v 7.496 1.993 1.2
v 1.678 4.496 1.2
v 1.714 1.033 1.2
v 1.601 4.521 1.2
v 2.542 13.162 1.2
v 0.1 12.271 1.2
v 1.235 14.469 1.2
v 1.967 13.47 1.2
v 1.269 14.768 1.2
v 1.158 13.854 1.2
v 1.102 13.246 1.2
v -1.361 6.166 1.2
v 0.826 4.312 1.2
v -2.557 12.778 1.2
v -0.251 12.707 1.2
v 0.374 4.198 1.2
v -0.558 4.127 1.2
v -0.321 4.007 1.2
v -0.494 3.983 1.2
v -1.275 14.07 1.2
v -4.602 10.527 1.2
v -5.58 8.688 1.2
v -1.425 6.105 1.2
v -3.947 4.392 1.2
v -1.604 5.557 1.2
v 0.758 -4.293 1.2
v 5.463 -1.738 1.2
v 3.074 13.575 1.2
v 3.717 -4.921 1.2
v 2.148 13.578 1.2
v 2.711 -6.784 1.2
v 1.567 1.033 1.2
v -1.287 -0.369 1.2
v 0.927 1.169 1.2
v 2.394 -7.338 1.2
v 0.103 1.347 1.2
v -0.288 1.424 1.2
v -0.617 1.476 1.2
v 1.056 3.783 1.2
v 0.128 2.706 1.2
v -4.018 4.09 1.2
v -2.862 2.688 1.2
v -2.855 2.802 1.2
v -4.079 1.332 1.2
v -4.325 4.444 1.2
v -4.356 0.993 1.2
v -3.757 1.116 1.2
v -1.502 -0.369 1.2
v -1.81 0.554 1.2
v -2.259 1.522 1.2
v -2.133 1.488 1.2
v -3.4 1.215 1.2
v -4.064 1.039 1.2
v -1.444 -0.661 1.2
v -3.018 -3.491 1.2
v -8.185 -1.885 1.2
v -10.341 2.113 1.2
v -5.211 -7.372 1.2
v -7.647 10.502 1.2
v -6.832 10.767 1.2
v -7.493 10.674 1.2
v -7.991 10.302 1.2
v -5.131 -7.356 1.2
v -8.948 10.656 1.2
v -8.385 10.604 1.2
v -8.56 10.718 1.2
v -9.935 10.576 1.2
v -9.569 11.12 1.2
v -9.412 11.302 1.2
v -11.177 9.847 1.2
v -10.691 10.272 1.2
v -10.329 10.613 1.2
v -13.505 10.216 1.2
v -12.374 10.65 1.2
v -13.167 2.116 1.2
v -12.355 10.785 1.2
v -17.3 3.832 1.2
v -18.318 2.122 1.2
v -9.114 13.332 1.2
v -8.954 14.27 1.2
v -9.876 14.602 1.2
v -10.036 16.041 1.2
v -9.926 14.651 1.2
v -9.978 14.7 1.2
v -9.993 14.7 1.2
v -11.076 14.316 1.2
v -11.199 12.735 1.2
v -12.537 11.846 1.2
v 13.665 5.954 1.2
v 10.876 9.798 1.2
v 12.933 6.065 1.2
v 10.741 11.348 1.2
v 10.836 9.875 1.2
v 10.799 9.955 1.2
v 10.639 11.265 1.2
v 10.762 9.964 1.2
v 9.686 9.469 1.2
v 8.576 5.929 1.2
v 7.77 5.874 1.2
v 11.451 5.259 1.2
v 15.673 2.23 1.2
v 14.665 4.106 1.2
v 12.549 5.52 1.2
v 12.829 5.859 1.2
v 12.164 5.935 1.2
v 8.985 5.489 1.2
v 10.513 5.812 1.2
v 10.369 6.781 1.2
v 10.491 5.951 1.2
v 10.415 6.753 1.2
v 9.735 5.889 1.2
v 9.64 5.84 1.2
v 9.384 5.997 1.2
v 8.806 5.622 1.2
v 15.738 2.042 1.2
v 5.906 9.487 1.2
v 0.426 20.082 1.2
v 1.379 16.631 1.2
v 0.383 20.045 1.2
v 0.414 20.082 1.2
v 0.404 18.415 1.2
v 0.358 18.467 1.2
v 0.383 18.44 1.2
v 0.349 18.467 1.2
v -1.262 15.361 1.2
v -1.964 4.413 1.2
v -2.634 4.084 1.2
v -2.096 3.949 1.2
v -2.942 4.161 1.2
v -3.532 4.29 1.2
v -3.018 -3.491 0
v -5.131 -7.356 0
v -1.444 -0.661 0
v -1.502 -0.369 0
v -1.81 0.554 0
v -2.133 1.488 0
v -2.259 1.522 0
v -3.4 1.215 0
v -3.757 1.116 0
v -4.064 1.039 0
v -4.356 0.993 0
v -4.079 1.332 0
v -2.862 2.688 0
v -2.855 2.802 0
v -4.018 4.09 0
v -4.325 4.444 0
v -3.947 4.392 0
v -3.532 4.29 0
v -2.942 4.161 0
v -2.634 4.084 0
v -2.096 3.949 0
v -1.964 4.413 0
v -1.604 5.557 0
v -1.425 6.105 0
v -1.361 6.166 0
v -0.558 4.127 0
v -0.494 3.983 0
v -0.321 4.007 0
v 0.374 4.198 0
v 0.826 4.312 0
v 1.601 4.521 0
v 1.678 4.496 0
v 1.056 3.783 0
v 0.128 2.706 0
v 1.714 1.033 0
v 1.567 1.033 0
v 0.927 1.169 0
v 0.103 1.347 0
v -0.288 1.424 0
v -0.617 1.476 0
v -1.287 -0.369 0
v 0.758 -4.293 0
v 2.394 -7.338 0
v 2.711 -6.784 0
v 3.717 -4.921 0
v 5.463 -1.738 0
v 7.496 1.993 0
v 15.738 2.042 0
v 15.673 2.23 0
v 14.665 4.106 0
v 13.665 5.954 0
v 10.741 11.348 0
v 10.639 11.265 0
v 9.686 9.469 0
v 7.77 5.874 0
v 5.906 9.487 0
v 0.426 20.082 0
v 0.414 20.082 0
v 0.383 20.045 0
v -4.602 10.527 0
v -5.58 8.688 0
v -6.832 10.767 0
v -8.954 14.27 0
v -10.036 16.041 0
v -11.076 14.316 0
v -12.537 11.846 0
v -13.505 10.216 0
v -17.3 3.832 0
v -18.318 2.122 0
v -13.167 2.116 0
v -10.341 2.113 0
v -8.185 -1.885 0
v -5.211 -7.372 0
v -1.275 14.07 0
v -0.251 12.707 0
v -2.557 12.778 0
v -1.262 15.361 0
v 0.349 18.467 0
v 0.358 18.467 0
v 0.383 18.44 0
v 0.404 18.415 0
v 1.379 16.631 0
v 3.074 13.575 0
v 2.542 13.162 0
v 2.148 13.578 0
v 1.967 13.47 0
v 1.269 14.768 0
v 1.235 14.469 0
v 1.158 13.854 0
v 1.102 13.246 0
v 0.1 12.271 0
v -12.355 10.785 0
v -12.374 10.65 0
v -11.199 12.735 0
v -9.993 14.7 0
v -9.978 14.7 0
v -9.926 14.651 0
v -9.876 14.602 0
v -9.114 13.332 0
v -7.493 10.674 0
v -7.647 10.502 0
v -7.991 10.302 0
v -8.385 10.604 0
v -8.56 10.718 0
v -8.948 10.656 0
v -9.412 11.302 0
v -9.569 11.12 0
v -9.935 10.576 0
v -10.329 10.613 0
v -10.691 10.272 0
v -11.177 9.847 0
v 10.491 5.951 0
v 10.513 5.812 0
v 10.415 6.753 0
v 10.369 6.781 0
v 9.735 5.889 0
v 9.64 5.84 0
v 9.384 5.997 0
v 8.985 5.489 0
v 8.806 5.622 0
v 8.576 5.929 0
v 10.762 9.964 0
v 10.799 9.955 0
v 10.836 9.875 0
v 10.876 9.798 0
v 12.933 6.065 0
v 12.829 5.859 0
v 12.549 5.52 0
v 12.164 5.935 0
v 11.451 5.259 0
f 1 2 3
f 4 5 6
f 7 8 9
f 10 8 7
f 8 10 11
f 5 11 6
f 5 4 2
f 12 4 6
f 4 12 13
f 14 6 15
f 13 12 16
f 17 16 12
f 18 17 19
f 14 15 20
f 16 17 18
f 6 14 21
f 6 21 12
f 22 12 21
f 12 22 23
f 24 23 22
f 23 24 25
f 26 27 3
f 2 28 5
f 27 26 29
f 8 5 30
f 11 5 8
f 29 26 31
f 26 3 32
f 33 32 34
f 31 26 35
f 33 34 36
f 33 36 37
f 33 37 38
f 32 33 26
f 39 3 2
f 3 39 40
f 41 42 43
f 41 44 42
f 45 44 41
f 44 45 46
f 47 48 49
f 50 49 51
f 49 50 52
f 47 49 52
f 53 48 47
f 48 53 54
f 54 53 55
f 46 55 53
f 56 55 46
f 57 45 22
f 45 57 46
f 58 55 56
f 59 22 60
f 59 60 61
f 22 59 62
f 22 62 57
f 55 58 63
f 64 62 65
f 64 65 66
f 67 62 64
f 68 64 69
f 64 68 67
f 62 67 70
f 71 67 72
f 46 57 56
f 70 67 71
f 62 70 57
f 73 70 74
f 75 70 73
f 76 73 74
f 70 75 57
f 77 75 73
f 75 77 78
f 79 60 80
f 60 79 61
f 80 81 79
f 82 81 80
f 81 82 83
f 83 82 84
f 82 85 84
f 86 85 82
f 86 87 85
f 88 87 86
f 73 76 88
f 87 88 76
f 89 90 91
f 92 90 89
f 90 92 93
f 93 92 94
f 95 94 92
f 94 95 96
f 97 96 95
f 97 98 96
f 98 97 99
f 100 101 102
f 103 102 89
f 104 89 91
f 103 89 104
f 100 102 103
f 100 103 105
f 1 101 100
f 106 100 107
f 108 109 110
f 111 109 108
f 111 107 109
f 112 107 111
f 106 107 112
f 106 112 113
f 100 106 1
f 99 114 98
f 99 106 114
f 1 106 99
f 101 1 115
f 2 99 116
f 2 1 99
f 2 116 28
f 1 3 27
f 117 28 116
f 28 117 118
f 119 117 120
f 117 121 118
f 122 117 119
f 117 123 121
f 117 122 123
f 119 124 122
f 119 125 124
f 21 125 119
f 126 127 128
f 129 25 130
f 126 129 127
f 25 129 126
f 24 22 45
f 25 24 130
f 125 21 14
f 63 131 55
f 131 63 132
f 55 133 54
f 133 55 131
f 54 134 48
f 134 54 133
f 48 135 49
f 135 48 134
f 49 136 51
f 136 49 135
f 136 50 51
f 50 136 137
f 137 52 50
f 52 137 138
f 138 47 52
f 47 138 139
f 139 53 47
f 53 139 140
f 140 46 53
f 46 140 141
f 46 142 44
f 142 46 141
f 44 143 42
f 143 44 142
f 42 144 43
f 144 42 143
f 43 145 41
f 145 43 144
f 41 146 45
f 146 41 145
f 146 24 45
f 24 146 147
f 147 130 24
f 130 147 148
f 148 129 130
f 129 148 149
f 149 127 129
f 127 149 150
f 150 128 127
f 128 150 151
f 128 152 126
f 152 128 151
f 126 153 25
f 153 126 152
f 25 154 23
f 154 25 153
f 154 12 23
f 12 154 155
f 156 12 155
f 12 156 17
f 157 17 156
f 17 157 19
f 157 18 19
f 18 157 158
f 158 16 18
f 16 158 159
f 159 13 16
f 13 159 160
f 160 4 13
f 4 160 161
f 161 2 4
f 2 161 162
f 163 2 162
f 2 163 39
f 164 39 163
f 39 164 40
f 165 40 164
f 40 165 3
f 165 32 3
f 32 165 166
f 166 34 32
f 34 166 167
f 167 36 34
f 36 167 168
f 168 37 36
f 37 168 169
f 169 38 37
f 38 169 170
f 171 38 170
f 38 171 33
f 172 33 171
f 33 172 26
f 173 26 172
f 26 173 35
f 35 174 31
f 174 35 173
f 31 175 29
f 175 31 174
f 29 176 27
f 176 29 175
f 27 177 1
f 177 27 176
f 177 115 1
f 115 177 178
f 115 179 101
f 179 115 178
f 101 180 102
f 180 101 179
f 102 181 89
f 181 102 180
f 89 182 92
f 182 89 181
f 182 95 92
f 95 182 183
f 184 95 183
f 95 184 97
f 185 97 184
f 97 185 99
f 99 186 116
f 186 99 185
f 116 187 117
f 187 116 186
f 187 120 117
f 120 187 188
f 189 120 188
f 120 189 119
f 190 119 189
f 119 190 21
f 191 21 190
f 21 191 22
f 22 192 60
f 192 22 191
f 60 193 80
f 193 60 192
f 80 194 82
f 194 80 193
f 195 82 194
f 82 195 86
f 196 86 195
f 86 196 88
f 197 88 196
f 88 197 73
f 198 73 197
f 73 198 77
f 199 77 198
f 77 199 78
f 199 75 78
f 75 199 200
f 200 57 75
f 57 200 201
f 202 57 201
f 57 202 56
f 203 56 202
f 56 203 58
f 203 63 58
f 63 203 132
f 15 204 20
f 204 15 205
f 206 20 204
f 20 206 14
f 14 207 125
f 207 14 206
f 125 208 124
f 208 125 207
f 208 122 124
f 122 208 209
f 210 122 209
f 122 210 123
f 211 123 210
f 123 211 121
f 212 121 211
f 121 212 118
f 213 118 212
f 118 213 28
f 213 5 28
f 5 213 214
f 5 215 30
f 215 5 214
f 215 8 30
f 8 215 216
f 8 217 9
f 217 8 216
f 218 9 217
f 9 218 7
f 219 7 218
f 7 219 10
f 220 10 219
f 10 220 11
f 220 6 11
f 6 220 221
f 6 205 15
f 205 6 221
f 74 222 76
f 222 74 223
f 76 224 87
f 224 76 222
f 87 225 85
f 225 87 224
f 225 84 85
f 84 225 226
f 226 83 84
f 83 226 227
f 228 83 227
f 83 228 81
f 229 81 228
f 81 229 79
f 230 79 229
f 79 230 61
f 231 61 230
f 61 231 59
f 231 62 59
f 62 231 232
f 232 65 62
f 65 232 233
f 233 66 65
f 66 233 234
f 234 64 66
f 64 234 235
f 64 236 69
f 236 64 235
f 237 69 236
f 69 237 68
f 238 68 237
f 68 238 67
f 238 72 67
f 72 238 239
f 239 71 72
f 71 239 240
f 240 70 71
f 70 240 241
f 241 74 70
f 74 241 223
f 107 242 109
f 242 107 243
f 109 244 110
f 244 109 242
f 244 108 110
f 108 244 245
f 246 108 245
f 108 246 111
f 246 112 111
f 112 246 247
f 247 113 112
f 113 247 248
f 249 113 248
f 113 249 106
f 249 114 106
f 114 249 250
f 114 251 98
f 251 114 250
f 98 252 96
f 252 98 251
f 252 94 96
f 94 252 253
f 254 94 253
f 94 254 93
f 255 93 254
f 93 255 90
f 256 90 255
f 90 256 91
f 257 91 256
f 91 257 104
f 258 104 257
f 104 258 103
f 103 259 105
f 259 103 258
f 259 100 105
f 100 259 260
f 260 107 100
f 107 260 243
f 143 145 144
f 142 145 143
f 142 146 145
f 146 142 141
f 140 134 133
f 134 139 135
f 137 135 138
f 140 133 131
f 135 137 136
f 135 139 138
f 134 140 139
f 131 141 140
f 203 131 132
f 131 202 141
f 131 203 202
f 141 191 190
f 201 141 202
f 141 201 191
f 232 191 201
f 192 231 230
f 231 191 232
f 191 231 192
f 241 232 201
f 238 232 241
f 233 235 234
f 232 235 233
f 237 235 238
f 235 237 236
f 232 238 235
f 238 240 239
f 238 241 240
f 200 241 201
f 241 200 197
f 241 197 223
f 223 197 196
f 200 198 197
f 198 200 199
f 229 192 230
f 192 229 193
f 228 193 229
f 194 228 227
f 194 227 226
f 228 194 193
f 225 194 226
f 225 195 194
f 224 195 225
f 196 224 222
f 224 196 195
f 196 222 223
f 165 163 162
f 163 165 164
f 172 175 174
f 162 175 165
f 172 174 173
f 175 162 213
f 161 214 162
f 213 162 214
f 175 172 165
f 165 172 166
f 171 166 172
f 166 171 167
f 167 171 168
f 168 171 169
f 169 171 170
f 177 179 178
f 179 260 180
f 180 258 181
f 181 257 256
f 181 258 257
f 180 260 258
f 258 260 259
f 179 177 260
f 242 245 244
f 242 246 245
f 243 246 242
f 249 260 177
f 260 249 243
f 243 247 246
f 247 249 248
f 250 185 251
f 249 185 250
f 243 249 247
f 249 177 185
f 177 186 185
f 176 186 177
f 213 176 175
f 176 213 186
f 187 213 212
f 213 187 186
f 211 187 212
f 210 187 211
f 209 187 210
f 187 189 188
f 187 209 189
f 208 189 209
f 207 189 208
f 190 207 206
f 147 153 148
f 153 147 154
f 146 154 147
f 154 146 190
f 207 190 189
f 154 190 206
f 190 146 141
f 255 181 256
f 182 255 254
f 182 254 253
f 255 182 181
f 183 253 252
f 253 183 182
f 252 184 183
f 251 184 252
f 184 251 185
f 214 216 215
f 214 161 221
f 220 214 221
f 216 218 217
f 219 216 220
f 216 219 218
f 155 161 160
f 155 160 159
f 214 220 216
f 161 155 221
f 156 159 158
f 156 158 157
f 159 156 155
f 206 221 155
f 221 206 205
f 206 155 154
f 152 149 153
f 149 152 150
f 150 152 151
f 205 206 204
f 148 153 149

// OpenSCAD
// file: ../Parts/rounder.scad
// rounder.scad
// cutting tool for rounding off corners with a cylinder

//---------------------
module rounder(
r=10,   // radius
h=10,   // height
f=22,    // $fn
extra=0.01  // extra size for the cube
){

difference(){
  translate([-extra,-extra,-extra])
  cube([r+extra,r+extra,h+2*extra]);
  translate([r,r,-1])
  cylinder(r=r,h=h+2,$fn=f);
}

}

//---------------------------------------------------------------------------
module bevel(x=1,y=1,h=10){

linear_extrude(height=h)
polygon(points=[[0,0],[x,0],[0,y]]);
    
}
  

//========================

rounder();

//========================
// file: WibbyMask.scad
module WibbyMask_1()
{
 /* Generated by trace2scad version 20150415
    http://aggregate.org/MAKE/TRACE2SCAD/
    Optimized model has 97/3062 original points
 */
 color([0.5, 0.5, 0.5])
 assign(minx=285) /* polygon minx=285 */
 assign(miny=200) /* polygon miny=200 */
 assign(maxx=17468) /* polygon maxx=17468 */
 assign(maxy=19710) /* polygon maxy=19710 */
 assign(dx=maxx-minx)
 assign(dy=maxy-miny)
 assign(maxd=((dx>dy)?dx:dy))
 scale([1/maxd, 1/maxd, 1])
 translate([-minx-dx/2, -miny-dy/2, 0])
 linear_extrude(height=1, convexity=97)
 union() {
  union() {
   polygon([[287,19704],[285,19698],[288,18948],[1165,18950],[1157,19707],[290,19710]], convexity=6);
   polygon([[16492,19689],[16490,19683],[16493,18798],[17405,18795],[17405,19695],[16495,19695]], convexity=6);
   polygon([[9006,16479],[9001,16473],[7380,13378],[7062,12780],[6655,13456],[5965,14595],[5613,15171],[5275,14610],[4800,13807],[4485,13277],[3251,11201],[2920,10645],[4595,10643],[5514,10642],[6215,9342],[7182,7558],[7208,7563],[7895,8820],[8410,9765],[8478,9783],[9588,7689],[9655,7569],[9758,7749],[10085,8355],[10653,9390],[11314,10603],[13994,10619],[13973,10680],[13645,11290],[13320,11891],[12369,13645],[12336,13618],[12026,13034],[11403,11865],[10797,13040],[9015,16485],[9011,16485]], convexity=12);
   polygon([[2910,9868],[2905,9863],[3560,8648],[3795,8212],[4335,7215],[4885,6200],[5510,5050],[6149,3878],[6207,3770],[7803,3787],[7839,3795],[8414,4987],[9076,3795],[9162,3787],[10697,3773],[11930,6068],[13020,8098],[13960,9863],[11730,9870],[11630,9678],[10440,7530],[9750,6288],[9638,6100],[9252,6792],[8835,7565],[8452,8255],[8055,7565],[7695,6928],[7440,6484],[7206,6065],[7180,6074],[6300,7680],[5715,8755],[5120,9845],[5062,9852],[2914,9873]], convexity=12);
   polygon([[380,986],[375,984],[375,350],[1275,350],[1269,985],[385,988]], convexity=6);
   polygon([[16433,872],[16430,868],[16430,200],[17468,203],[17468,873],[16437,875]], convexity=6);
  }
 }
}

module WibbyMask()
{
 /* all layers combined, scaled to within a 1mm cube */
 scale([1, 1, 1/1])
 difference() {
  union() {
   scale([1,1,2]) translate([0,0,-0.5]) WibbyMask_1();
  }
  translate([0,0,-2]) cube([2,2,4],center=true);
 }
}
WibbyMask();
// file: WibbyW.scad
module WibbyW_1()
{
 /* Generated by trace2scad version 20150415
    http://aggregate.org/MAKE/TRACE2SCAD/
    Optimized model has 81/1762 original points
 */
 color([0.5, 0.5, 0.5])
 assign(minx=285) /* polygon minx=285 */
 assign(miny=200) /* polygon miny=200 */
 assign(maxx=17468) /* polygon maxx=17468 */
 assign(maxy=19710) /* polygon maxy=19710 */
 assign(dx=maxx-minx)
 assign(dy=maxy-miny)
 assign(maxd=((dx>dy)?dx:dy))
 scale([1/maxd, 1/maxd, 1])
 translate([-minx-dx/2, -miny-dy/2, 0])
 linear_extrude(height=1, convexity=81)
 union() {
  union() {
   polygon([[287,19704],[285,19698],[288,18948],[1165,18950],[1157,19707],[290,19710]], convexity=6);
   polygon([[16492,19689],[16490,19683],[16493,18798],[17405,18795],[17405,19695],[16495,19695]], convexity=6);
   union() {
    difference() {
     polygon([[2910,9868],[2905,9863],[3560,8648],[3795,8212],[4335,7215],[4885,6200],[5510,5050],[6149,3878],[6207,3770],[7803,3787],[7839,3795],[8414,4987],[9076,3795],[9162,3787],[10697,3773],[11930,6068],[13020,8098],[13960,9863],[11730,9870],[11630,9678],[10440,7530],[9750,6288],[9638,6100],[9252,6792],[8835,7565],[8452,8255],[8055,7565],[7695,6928],[7440,6484],[7206,6065],[7180,6074],[6300,7680],[5715,8755],[5120,9845],[5062,9852],[2914,9873]], convexity=12);
     polygon([[8443,7914],[8454,7903],[9195,6593],[9185,6514],[9142,6413],[8893,6648],[8768,6290],[8746,6307],[8604,6651],[8532,6625],[8479,6623],[8345,6960],[8336,6975],[8140,6590],[8105,6598],[8048,6625],[7958,6443],[7923,6440],[7723,6639],[8421,7925],[8433,7925]], convexity=14);
    }
   }
   polygon([[380,986],[375,984],[375,350],[1275,350],[1269,985],[385,988]], convexity=6);
   polygon([[16433,872],[16430,868],[16430,200],[17468,203],[17468,873],[16437,875]], convexity=6);
  }
 }
}

module WibbyW()
{
 /* all layers combined, scaled to within a 1mm cube */
 scale([1, 1, 1/1])
 difference() {
  union() {
   scale([1,1,2]) translate([0,0,-0.5]) WibbyW_1();
  }
  translate([0,0,-2]) cube([2,2,4],center=true);
 }
}
WibbyW();
// file: WibbyWhite.scad
module WibbyWhite_1()
{
 /* Generated by trace2scad version 20150415
    http://aggregate.org/MAKE/TRACE2SCAD/
    Optimized model has 139/1729 original points
 */
 color([0.5, 0.5, 0.5])
 assign(minx=285) /* polygon minx=285 */
 assign(miny=200) /* polygon miny=200 */
 assign(maxx=17468) /* polygon maxx=17468 */
 assign(maxy=19710) /* polygon maxy=19710 */
 assign(dx=maxx-minx)
 assign(dy=maxy-miny)
 assign(maxd=((dx>dy)?dx:dy))
 scale([1/maxd, 1/maxd, 1])
 translate([-minx-dx/2, -miny-dy/2, 0])
 linear_extrude(height=1, convexity=139)
 union() {
  union() {
   polygon([[287,19704],[285,19698],[288,18948],[1165,18950],[1157,19707],[290,19710]], convexity=6);
   polygon([[16492,19689],[16490,19683],[16493,18798],[17405,18795],[17405,19695],[16495,19695]], convexity=6);
   polygon([[8979,15951],[8972,15943],[8045,14118],[8053,14110],[8468,14530],[8901,13945],[8917,13945],[9235,14262],[9253,14460],[9278,14660],[9294,14760],[9525,14335],[9584,14370],[9710,14235],[9876,14369],[8990,15960],[8987,15960]], convexity=12);
   polygon([[5610,14717],[5600,14699],[4849,13451],[4853,13418],[5242,13157],[5400,13295],[5518,13406],[5655,13403],[5808,13630],[5840,13604],[5967,13420],[6110,13433],[6278,13305],[6419,13391],[6440,13426],[5950,14227],[5649,14719],[5621,14735]], convexity=12);
   polygon([[12366,13177],[12355,13159],[11673,11900],[11665,11872],[11790,11740],[11880,11840],[11928,11905],[12020,11848],[12090,11938],[12256,12160],[12270,12143],[12288,11890],[12306,11840],[12600,11665],[12843,11885],[12957,11750],[13073,11895],[13083,11942],[12382,13194],[12376,13195]], convexity=12);
   polygon([[8415,11944],[8408,11928],[8355,11762],[8245,11415],[8186,11243],[8020,11283],[7920,11308],[7593,11383],[7470,11396],[7570,11285],[7948,10866],[7946,10829],[7460,10281],[7549,10285],[7583,10300],[7655,10318],[8173,10450],[8195,10414],[8288,10135],[8388,9835],[8420,9760],[8470,9881],[8676,10435],[8783,10418],[8910,10393],[9145,10343],[9428,10285],[9423,10313],[8918,10835],[9178,11135],[9422,11417],[9333,11415],[9263,11390],[9073,11340],[8932,11300],[8739,11250],[8716,11250],[8495,11810],[8428,11960],[8422,11960]], convexity=14);
   polygon([[8416,7919],[8412,7913],[7718,6635],[7923,6440],[7958,6443],[8058,6625],[8125,6590],[8148,6609],[8336,6975],[8488,6615],[8560,6633],[8604,6651],[8758,6291],[8795,6370],[8893,6648],[9144,6423],[9195,6567],[9169,6634],[8433,7925],[8421,7925]], convexity=14);
   polygon([[380,986],[375,984],[375,350],[1275,350],[1269,985],[385,988]], convexity=6);
   polygon([[16433,872],[16430,868],[16430,200],[17468,203],[17468,873],[16437,875]], convexity=6);
  }
 }
}

module WibbyWhite()
{
 /* all layers combined, scaled to within a 1mm cube */
 scale([1, 1, 1/1])
 difference() {
  union() {
   scale([1,1,2]) translate([0,0,-0.5]) WibbyWhite_1();
  }
  translate([0,0,-2]) cube([2,2,4],center=true);
 }
}
WibbyWhite();
// file: WibbyMtn.scad
module WibbyMtn_1()
{
 /* Generated by trace2scad version 20150415
    http://aggregate.org/MAKE/TRACE2SCAD/
    Optimized model has 155/3016 original points
 */
 color([0.5, 0.5, 0.5])
 assign(minx=285) /* polygon minx=285 */
 assign(miny=200) /* polygon miny=200 */
 assign(maxx=17468) /* polygon maxx=17468 */
 assign(maxy=19710) /* polygon maxy=19710 */
 assign(dx=maxx-minx)
 assign(dy=maxy-miny)
 assign(maxd=((dx>dy)?dx:dy))
 scale([1/maxd, 1/maxd, 1])
 translate([-minx-dx/2, -miny-dy/2, 0])
 linear_extrude(height=1, convexity=155)
 union() {
  union() {
   polygon([[287,19704],[285,19698],[288,18948],[1165,18950],[1157,19707],[290,19710]], convexity=6);
   polygon([[16492,19689],[16490,19683],[16493,18798],[17405,18795],[17405,19695],[16495,19695]], convexity=6);
   union() {
    difference() {
     polygon([[9006,16479],[9001,16473],[7380,13378],[7062,12780],[6655,13456],[5965,14595],[5613,15171],[5275,14610],[4800,13807],[4485,13277],[3251,11201],[2920,10645],[4595,10643],[5514,10642],[6215,9342],[7182,7558],[7208,7563],[7895,8820],[8407,9740],[8388,9835],[8288,10135],[8183,10439],[8142,10450],[7771,10350],[7655,10318],[7555,10293],[7460,10278],[7550,10388],[7946,10829],[7948,10866],[7570,11285],[7470,11400],[7593,11383],[7728,11350],[7920,11308],[8020,11283],[8195,11239],[8238,11390],[8355,11762],[8413,11940],[8434,11960],[8695,11297],[8716,11250],[8772,11258],[8998,11320],[9145,11357],[9397,11425],[9422,11417],[9220,11185],[8918,10835],[9434,10291],[9386,10291],[9178,10335],[8910,10393],[8783,10418],[8676,10435],[8458,9835],[9123,8559],[9655,7569],[9758,7749],[10085,8355],[10653,9390],[11314,10603],[13994,10619],[13973,10680],[13645,11290],[13320,11891],[12369,13645],[12336,13618],[12026,13034],[11403,11865],[10797,13040],[9015,16485],[9011,16485]], convexity=25);
     polygon([[9001,15951],[9008,15943],[9325,15363],[9876,14369],[9703,14235],[9575,14370],[9516,14335],[9289,14757],[9278,14660],[9253,14460],[9235,14262],[8909,13945],[8795,14087],[8462,14530],[8045,14110],[8466,14950],[8990,15960],[8993,15960]], convexity=11);
     polygon([[5649,14719],[5665,14703],[5913,14290],[6440,13426],[6390,13370],[6278,13305],[6150,13403],[6093,13440],[5967,13420],[5816,13630],[5765,13571],[5646,13394],[5518,13406],[5400,13295],[5242,13157],[4853,13418],[4859,13462],[5235,14096],[5627,14735],[5632,14735]], convexity=12);
     polygon([[12400,13166],[12413,13141],[13082,11927],[13048,11860],[12957,11750],[12832,11885],[12600,11665],[12295,11845],[12288,11890],[12263,12151],[12248,12160],[12042,11870],[12011,11854],[11928,11905],[11798,11740],[11740,11783],[11665,11883],[12376,13195],[12388,13192]], convexity=13);
    }
   }
   polygon([[380,986],[375,984],[375,350],[1275,350],[1269,985],[385,988]], convexity=6);
   polygon([[16433,872],[16430,868],[16430,200],[17468,203],[17468,873],[16437,875]], convexity=6);
  }
 }
}

module WibbyMtn()
{
 /* all layers combined, scaled to within a 1mm cube */
 scale([1, 1, 1/1])
 difference() {
  union() {
   scale([1,1,2]) translate([0,0,-0.5]) WibbyMtn_1();
  }
  translate([0,0,-2]) cube([2,2,4],center=true);
 }
}
WibbyMtn();
// file: WibbyUpperShadow.scad
module WibbyUpperShadow_1()
{
 /* Generated by trace2scad version 20150415
    http://aggregate.org/MAKE/TRACE2SCAD/
    Optimized model has 45/257 original points
 */
 color([0.5, 0.5, 0.5])
 assign(minx=285) /* polygon minx=285 */
 assign(miny=200) /* polygon miny=200 */
 assign(maxx=17468) /* polygon maxx=17468 */
 assign(maxy=19710) /* polygon maxy=19710 */
 assign(dx=maxx-minx)
 assign(dy=maxy-miny)
 assign(maxd=((dx>dy)?dx:dy))
 scale([1/maxd, 1/maxd, 1])
 translate([-minx-dx/2, -miny-dy/2, 0])
 linear_extrude(height=1, convexity=45)
 union() {
  union() {
   polygon([[287,19704],[285,19698],[288,18948],[1165,18950],[1157,19707],[290,19710]], convexity=6);
   polygon([[16492,19689],[16490,19683],[16493,18798],[17405,18795],[17405,19695],[16495,19695]], convexity=6);
   polygon([[2894,10444],[2886,10438],[2777,10185],[5450,10195],[5287,10433],[2903,10451]], convexity=5);
   polygon([[11447,10284],[11408,10218],[9735,7374],[9867,7107],[11583,10136],[14220,10117],[14077,10320],[13778,10315],[11486,10350]], convexity=9);
   polygon([[8458,9369],[8451,9358],[7315,7301],[7451,7058],[8605,9127],[8466,9381]], convexity=6);
   polygon([[380,986],[375,984],[375,350],[1275,350],[1269,985],[385,988]], convexity=6);
   polygon([[16433,872],[16430,868],[16430,200],[17468,203],[17468,873],[16437,875]], convexity=6);
  }
 }
}

module WibbyUpperShadow()
{
 /* all layers combined, scaled to within a 1mm cube */
 scale([1, 1, 1/1])
 difference() {
  union() {
   scale([1,1,2]) translate([0,0,-0.5]) WibbyUpperShadow_1();
  }
  translate([0,0,-2]) cube([2,2,4],center=true);
 }
}
WibbyUpperShadow();
// file: WibbyLowShadow.scad
module WibbyLowShadow_1()
{
 /* Generated by trace2scad version 20150415
    http://aggregate.org/MAKE/TRACE2SCAD/
    Optimized model has 41/374 original points
 */
 color([0.5, 0.5, 0.5])
 assign(minx=285) /* polygon minx=285 */
 assign(miny=200) /* polygon miny=200 */
 assign(maxx=17468) /* polygon maxx=17468 */
 assign(maxy=19710) /* polygon maxy=19710 */
 assign(dx=maxx-minx)
 assign(dy=maxy-miny)
 assign(maxd=((dx>dy)?dx:dy))
 scale([1/maxd, 1/maxd, 1])
 translate([-minx-dx/2, -miny-dy/2, 0])
 linear_extrude(height=1, convexity=41)
 union() {
  union() {
   polygon([[287,19704],[285,19698],[288,18948],[1165,18950],[1157,19707],[290,19710]], convexity=6);
   polygon([[16492,19689],[16490,19683],[16493,18798],[17405,18795],[17405,19695],[16495,19695]], convexity=6);
   polygon([[14048,9471],[13988,9470],[10782,3588],[9174,3601],[9307,3375],[10961,3373],[13480,8093],[14215,9469],[14108,9473]], convexity=7);
   polygon([[8412,4569],[8407,4563],[7898,3595],[6325,3577],[6443,3380],[8054,3390],[8566,4335],[8416,4575]], convexity=6);
   polygon([[380,986],[375,984],[375,350],[1275,350],[1269,985],[385,988]], convexity=6);
   polygon([[16433,872],[16430,868],[16430,200],[17468,203],[17468,873],[16437,875]], convexity=6);
  }
 }
}

module WibbyLowShadow()
{
 /* all layers combined, scaled to within a 1mm cube */
 scale([1, 1, 1/1])
 difference() {
  union() {
   scale([1,1,2]) translate([0,0,-0.5]) WibbyLowShadow_1();
  }
  translate([0,0,-2]) cube([2,2,4],center=true);
 }
}
WibbyLowShadow();
// main file
//=================================================================================
// Wibby.scad
//
//
// Dr Tom Flint, 16 Feb 2023
//=================================================================================

use <./WibbyLowShadow.scad>
use <./WibbyUpperShadow.scad>
use <./WibbyMtn.scad>
use <./WibbyWhite.scad>
use <./WibbyW.scad>
use <./WibbyMask.scad>

use <../Parts/rounder.scad>

sx = 40;        // size of square
sy = 60;
mag = 60;		    // magnification of traces
thick = 1.2;    // thickness
thin = 0.9;     // thickness of the sanding frame
rx=1.5;         // rounding of corners

//-----------------------------------------------------------------------------------
module wibMtn(){
  
  intersection(){
    cube([sx,sy,4*thick],center=true);
    scale([mag,mag,thick])
    WibbyMtn();
  }
}

//-----------------------------------------------------------------------------------
module wibW(){
  
  intersection(){
    cube([sx,sy,4*thick],center=true);
    scale([mag,mag,thick])
    WibbyW();
  }
}

//-----------------------------------------------------------------------------------
module wibWhite(){
  
  intersection(){
    cube([sx,sy,4*thick],center=true);
    scale([mag,mag,thick])
    WibbyWhite();
  }
}

//-----------------------------------------------------------------------------------
module wibUp(){
  
  intersection(){
    cube([sx,sy,4*thick],center=true);
    scale([mag,mag,thick])
    WibbyUpperShadow();
  }
}

//-----------------------------------------------------------------------------------
module wibLow(){
  
  intersection(){
    cube([sx,sy,4*thick],center=true);
    scale([mag,mag,thick])
    WibbyLowShadow();
  }
}

//-----------------------------------------------------------------------------------
module wibBack(){

  difference(){
    translate([-1.5,0,thick/2])
    cylinder(r=22,h=thick,center=true,$fn=99);
  
    translate([0,0,-1])
    scale([mag,mag,2*thick])
    WibbyMask();
  }
}

//-----------------------------------------------------------------------------------
module wibRim(){

  translate([-1.5,0,thick/2])
  difference(){
    cylinder(r=23,h=thick,center=true,$fn=99);
    cylinder(r=22,h=2*thick,center=true,$fn=99);
  }
}

//-----------------------------------------------------------------------------------
module wibFrame(){

  translate([-0.5,0,thin/2])
  difference(){
    cylinder(r=25,h=thin,center=true,$fn=99);
    cylinder(r=23+0.15,h=2*thin,center=true,$fn=99);
  }
  
  difference(){
    hull(){
      translate([24,0,thin/2])
      cube([2,10,thin],center=true);
      translate([22+30,0,thin/2])
      cube([2,6,thin],center=true);
    }
    hull(){
      translate([22+4,0,thin/2])
      cube([2,5,2*thin],center=true);
      translate([22+26,0,thin/2])
      cube([2,2,2*thin],center=true);
    }
  }    
  translate([22+30,0,3])
  cube([2,6,6],center=true);


  difference(){
    hull(){
      translate([0,24,thin/2])
      cube([10,2,thin],center=true);
      translate([0,22+30,thin/2])
      cube([6,2,thin],center=true);
    }
    hull(){
      translate([0,22+4,thin/2])
      cube([5,2,2*thin],center=true);
      translate([0,22+26,thin/2])
      cube([2,2,2*thin],center=true);
    }
  }
  translate([0,22+30,3])
  cube([6,2,6],center=true);

}

//===================================================================================

wibMtn();
//~ wibW();
//~ wibWhite();
//~ wibUp();
//~ wibLow();

//~ wibBack();
//~ wibRim();

//wibFrame();

//~ WibbyMask();
//===================================================================================
